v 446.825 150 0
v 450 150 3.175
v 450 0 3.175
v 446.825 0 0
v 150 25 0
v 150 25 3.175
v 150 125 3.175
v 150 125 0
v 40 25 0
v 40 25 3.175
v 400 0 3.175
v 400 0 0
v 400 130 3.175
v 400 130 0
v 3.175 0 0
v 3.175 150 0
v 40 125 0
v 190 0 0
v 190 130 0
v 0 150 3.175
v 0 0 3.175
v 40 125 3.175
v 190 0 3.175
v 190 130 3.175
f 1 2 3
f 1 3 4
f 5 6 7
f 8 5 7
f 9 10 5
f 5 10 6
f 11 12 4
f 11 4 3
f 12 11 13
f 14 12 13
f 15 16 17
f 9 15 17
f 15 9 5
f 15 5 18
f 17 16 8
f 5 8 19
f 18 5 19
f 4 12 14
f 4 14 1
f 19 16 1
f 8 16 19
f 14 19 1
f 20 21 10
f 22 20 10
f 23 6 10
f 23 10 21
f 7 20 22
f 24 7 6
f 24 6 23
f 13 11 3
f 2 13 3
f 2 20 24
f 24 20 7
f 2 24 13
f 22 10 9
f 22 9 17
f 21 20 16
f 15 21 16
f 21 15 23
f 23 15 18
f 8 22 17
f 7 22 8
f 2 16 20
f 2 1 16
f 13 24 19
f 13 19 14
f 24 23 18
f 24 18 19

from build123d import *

# Parameters (mm, degrees)
SKETCH1_W           = 450
SKETCH1_H           = 150
BOSS_EXTRUDE1_DEPTH = 3.175
CUT_EXTRUDE1_DEPTH  = 475.352274818
SKETCH3_W           = 210
SKETCH3_H           = 130
SKETCH3_W_2         = 110
SKETCH3_H_2         = 100
CUT_EXTRUDE2_DEPTH  = 475.352274818


with BuildPart() as part:
    # Sketch1 → Boss-Extrude1 (new body)
    with BuildSketch(Plane.XY):
        with Locations((225, 75)):
            Rectangle(SKETCH1_W, SKETCH1_H)
    extrude(amount=BOSS_EXTRUDE1_DEPTH)

    # Sketch2 → Cut-Extrude1 (cut, through all)
    with BuildSketch(Plane(origin=(0, 150, 0), x_dir=(1, 0, 0), z_dir=(0, 1, 0))):
        Polygon((0, -3.175), (3.175, 0), (0, 0), align=None)
        Polygon((450, -3.175), (446.825, 0), (450, 0), align=None)
    extrude(amount=-CUT_EXTRUDE1_DEPTH, mode=Mode.SUBTRACT)

    # Sketch3 → Cut-Extrude2 (cut, through all)
    with BuildSketch(Plane.XY.offset(3.175)):
        with Locations((295, 65)):
            Rectangle(SKETCH3_W, SKETCH3_H)
        with Locations((95, 75)):
            Rectangle(SKETCH3_W_2, SKETCH3_H_2)
    extrude(amount=-CUT_EXTRUDE2_DEPTH, mode=Mode.SUBTRACT)


solid = part.part
